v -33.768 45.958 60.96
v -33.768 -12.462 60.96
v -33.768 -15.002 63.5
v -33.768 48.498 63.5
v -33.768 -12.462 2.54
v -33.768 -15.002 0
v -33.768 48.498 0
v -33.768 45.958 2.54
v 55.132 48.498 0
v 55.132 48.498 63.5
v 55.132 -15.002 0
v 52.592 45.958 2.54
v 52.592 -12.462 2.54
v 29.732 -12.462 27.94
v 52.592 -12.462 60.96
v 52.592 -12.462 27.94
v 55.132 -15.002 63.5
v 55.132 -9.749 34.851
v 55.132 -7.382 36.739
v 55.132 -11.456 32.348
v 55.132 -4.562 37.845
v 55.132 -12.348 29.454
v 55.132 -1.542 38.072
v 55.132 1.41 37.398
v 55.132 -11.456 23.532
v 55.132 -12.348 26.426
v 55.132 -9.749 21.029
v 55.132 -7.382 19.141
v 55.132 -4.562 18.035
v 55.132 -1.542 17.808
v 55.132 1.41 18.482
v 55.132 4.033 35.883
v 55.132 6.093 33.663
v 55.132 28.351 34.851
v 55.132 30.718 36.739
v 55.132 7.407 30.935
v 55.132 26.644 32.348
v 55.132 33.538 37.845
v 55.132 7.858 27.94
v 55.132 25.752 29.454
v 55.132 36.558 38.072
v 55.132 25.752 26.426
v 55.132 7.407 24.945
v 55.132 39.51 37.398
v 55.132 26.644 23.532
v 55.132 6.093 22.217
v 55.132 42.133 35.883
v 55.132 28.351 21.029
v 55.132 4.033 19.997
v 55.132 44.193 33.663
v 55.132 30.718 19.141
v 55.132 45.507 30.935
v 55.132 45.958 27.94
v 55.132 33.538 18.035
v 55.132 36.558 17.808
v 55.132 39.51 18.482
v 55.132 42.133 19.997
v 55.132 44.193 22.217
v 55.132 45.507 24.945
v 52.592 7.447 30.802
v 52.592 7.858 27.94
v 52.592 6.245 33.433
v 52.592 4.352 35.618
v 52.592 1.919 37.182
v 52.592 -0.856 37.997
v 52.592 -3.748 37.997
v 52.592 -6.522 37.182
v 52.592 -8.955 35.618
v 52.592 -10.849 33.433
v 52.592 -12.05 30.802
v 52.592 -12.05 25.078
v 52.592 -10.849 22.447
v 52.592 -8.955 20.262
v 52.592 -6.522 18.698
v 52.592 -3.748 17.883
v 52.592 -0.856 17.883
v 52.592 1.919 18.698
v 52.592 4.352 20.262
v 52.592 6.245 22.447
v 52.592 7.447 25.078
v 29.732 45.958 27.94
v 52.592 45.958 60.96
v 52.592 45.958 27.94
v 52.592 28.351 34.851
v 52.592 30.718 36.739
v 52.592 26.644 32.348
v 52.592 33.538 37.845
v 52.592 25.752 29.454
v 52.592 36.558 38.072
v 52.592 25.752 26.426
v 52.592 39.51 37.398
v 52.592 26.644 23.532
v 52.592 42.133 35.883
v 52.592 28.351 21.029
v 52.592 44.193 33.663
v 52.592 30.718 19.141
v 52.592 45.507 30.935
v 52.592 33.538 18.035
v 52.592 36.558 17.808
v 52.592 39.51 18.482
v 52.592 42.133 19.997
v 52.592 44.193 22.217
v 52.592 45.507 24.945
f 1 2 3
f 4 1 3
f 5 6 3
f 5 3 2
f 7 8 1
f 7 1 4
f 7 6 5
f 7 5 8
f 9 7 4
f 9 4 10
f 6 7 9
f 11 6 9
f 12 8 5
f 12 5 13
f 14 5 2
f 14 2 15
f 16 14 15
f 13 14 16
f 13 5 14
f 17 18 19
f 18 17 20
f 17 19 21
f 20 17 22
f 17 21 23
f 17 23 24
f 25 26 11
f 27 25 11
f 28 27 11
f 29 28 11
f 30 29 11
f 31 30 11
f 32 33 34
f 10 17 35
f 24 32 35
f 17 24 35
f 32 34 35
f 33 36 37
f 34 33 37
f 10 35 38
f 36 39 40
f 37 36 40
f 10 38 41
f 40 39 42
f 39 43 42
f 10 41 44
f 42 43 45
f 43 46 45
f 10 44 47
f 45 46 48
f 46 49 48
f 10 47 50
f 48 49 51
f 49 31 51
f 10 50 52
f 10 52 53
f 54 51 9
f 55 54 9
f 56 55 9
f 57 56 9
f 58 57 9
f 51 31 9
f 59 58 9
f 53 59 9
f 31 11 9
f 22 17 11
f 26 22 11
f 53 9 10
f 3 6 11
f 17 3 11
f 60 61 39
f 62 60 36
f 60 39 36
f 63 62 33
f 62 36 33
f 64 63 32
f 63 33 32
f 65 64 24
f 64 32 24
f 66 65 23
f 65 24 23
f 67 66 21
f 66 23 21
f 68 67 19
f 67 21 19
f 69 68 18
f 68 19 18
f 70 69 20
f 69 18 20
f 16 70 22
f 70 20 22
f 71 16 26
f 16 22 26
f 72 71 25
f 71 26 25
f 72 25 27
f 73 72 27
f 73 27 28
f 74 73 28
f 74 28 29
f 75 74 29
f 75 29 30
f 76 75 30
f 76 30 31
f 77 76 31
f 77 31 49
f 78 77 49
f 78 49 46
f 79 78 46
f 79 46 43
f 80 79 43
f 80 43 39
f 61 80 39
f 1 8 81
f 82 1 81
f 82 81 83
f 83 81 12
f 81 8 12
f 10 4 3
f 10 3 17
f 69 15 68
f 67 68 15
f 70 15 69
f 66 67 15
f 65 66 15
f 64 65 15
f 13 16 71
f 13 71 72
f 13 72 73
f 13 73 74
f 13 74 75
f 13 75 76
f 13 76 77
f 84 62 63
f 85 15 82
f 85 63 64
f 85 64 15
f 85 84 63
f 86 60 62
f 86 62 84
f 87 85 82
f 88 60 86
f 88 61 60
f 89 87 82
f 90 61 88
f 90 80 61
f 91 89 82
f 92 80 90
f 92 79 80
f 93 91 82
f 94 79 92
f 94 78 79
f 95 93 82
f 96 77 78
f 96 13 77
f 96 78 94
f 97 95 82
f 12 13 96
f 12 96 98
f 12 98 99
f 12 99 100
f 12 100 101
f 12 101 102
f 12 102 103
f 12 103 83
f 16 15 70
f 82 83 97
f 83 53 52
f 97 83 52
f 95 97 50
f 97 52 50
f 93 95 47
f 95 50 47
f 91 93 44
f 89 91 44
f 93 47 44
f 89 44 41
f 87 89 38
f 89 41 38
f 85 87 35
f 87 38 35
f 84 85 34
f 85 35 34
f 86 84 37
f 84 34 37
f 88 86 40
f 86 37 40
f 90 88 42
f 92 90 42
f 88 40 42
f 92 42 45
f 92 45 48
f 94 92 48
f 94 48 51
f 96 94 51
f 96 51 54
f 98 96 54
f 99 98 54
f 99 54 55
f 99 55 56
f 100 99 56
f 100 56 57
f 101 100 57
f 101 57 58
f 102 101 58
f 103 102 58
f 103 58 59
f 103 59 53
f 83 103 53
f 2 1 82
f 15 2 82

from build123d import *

# Parameters (mm, degrees)
F0_W     = 88.9
F0_H     = 63.5
F1_DEPTH = 63.5
F3_T     = -2.54
F2_R     = 10.16
F4_DEPTH = 25.4


with BuildPart() as f1:
    # F0 (on Top) → F1 (new body)
    with BuildSketch(Plane.XY):
        with Locations((10.68233, 16.748335)):
            Rectangle(F0_W, F0_H)
    extrude(amount=F1_DEPTH)

    # F3
    f3_openings = [f1.faces().sort_by_distance(p)[0] for p in [
        (-33.76767, 16.748335, 31.75),
    ]]
    offset(amount=F3_T, openings=f3_openings)

    # F2 (on face) → F4 (cut)
    with BuildSketch(Plane.YZ.offset(55.13233)):
        with Locations((-2.301665, 27.94)):
            Circle(F2_R)
        with Locations((35.798335, 27.94)):
            Circle(F2_R)
    extrude(amount=-F4_DEPTH, mode=Mode.SUBTRACT)


solid = f1.part
